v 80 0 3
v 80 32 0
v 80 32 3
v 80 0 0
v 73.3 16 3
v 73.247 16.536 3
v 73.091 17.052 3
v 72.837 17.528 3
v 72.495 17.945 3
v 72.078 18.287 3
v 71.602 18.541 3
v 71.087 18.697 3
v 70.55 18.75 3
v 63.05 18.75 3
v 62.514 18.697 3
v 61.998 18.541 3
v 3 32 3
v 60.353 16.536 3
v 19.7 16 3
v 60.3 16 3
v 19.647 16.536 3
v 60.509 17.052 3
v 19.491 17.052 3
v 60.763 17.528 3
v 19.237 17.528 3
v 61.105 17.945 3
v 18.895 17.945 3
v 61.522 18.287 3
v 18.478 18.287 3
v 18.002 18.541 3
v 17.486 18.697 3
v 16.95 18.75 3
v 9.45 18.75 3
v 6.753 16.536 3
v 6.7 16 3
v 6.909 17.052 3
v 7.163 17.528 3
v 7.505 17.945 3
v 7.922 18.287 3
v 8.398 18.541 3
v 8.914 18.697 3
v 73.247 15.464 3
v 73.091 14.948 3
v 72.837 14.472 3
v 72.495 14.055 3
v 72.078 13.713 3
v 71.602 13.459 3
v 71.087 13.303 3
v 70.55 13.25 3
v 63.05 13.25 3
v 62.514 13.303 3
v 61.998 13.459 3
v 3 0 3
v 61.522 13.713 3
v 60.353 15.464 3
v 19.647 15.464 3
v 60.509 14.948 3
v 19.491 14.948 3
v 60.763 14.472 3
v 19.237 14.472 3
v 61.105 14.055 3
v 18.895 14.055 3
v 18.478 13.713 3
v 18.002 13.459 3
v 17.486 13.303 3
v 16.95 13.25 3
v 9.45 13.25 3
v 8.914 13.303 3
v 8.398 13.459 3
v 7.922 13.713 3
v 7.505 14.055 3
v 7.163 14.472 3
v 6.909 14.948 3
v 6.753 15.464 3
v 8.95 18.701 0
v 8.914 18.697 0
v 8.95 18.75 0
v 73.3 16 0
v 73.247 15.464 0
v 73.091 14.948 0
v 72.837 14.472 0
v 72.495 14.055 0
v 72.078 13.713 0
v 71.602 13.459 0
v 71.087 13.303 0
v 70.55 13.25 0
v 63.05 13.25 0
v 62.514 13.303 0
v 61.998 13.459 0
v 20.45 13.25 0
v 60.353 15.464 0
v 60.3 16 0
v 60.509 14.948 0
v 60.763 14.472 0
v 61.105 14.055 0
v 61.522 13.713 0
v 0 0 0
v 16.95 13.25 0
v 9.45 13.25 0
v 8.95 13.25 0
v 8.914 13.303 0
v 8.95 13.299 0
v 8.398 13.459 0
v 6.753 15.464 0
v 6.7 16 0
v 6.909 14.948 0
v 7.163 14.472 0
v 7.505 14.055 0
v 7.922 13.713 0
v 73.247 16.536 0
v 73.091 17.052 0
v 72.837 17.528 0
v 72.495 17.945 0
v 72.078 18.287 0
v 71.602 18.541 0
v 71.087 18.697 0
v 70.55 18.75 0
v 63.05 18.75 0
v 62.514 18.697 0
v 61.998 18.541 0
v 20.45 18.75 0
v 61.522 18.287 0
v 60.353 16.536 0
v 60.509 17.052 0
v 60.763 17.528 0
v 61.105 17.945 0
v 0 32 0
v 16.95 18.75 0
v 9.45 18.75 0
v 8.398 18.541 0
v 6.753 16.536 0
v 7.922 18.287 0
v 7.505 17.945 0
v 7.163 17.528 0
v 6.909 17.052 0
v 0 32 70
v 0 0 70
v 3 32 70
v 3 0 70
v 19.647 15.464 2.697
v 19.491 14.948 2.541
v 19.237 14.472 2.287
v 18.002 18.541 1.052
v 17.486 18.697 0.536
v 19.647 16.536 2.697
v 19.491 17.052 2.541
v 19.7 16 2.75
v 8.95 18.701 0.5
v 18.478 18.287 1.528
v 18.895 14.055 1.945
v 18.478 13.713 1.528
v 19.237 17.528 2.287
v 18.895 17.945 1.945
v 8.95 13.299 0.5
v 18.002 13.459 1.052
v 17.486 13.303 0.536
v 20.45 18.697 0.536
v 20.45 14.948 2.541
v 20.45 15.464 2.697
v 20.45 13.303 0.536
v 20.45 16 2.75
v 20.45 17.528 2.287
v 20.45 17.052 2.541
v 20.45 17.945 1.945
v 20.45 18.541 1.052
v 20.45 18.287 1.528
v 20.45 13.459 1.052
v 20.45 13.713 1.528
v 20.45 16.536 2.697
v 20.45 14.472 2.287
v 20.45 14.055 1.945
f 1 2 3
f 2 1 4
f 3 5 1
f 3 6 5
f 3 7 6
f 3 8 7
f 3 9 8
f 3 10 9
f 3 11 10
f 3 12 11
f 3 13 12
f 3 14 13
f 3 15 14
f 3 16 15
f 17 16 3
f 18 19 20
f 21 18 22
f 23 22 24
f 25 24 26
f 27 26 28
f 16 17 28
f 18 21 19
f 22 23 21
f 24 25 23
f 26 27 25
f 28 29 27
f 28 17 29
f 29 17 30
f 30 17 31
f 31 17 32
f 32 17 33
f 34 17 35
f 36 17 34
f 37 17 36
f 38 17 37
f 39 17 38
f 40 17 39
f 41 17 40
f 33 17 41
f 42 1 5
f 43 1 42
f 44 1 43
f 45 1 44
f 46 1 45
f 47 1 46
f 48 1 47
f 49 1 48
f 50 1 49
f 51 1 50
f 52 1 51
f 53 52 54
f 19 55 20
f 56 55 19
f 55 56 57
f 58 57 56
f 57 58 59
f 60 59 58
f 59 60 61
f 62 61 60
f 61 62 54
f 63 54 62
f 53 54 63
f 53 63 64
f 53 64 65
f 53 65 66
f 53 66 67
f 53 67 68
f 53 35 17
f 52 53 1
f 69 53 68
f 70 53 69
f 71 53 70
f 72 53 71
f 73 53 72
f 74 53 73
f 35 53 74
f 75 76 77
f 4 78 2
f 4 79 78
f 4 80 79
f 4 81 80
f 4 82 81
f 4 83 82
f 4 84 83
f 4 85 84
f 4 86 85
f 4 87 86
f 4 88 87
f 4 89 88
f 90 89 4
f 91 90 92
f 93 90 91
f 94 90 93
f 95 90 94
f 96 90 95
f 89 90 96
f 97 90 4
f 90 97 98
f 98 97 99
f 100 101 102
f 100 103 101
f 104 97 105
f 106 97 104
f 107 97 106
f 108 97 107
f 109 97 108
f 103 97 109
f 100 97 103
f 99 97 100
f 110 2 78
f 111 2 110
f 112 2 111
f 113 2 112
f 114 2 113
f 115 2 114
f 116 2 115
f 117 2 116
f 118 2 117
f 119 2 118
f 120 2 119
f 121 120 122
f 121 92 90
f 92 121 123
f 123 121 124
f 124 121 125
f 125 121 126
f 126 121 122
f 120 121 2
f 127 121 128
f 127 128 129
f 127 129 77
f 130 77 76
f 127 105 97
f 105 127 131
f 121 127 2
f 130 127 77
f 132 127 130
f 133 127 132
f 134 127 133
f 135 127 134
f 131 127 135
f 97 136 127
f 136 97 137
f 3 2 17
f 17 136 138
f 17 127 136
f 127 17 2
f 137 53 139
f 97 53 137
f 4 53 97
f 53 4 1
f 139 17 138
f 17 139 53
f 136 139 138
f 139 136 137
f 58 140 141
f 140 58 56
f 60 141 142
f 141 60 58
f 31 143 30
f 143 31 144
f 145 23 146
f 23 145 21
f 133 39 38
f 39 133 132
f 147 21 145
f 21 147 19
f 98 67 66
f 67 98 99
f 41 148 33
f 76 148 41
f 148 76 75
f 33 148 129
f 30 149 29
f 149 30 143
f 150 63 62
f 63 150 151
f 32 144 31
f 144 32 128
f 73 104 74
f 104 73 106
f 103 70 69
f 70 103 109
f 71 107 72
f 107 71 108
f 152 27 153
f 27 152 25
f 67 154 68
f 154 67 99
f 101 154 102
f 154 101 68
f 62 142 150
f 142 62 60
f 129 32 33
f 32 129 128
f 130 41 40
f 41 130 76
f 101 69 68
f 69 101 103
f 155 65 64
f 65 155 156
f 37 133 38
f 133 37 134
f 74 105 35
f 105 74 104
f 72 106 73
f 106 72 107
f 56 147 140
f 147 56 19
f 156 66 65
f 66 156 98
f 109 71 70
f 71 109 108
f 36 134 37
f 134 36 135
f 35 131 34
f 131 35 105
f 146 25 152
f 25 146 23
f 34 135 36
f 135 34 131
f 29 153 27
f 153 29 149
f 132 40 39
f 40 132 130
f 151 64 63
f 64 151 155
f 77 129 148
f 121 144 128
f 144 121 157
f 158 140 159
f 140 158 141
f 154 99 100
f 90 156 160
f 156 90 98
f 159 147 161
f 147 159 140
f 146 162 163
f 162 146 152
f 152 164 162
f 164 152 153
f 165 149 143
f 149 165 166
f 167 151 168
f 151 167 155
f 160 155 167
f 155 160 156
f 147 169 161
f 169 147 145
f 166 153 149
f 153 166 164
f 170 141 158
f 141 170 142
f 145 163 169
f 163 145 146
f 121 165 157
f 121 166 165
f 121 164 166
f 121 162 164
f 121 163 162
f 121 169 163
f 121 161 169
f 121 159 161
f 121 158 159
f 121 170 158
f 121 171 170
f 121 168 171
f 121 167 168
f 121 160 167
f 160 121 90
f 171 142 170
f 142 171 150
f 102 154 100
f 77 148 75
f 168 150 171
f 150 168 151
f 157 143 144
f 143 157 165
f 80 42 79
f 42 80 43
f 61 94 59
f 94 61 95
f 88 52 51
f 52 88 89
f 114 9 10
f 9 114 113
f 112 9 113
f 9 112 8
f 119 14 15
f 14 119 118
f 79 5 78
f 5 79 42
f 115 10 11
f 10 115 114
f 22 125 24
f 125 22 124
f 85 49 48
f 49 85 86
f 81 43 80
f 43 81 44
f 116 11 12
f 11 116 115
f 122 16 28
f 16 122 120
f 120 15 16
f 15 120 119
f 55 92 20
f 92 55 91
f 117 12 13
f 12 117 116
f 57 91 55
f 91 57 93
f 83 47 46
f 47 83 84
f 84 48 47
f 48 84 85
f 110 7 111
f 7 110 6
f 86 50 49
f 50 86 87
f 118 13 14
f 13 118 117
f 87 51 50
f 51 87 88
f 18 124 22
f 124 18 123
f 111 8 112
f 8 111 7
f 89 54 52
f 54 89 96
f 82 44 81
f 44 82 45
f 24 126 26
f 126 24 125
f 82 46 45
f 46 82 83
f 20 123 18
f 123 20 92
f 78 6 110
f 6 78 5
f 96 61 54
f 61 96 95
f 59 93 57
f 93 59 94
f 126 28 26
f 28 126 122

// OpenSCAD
$fn = 32;

// ----------------------------------------------------------------------
// L-bracket: 80 x 32 x 70 mm
// ----------------------------------------------------------------------

// --- parameters (mm) ---
horiz_len = 80;           // horizontal leg, X
vert_len = 70;            // vertical leg, Z
profile_w = 32;           // bracket depth, Y
plate_t = 3;              // plate thickness
hole_d = 6.6;             // clearance for M6
slot_w = 5.5;             // euro screw slot width
slot_l = 13;              // euro screw slot length

module hole_z(px, py) {
  translate([px, py, -0.5]) cylinder(h = plate_t + 1, d = hole_d);
}
module hole_x(pz, py) {
  translate([-0.5, py, pz]) rotate([0, 90, 0]) cylinder(h = plate_t + 1, d = hole_d);
}
module euro_slot_z(px, py) {
  hull() {
    translate([px - (slot_l - slot_w) / 2, py, -0.5]) cylinder(h = plate_t + 1, d = slot_w);
    translate([px + (slot_l - slot_w) / 2, py, -0.5]) cylinder(h = plate_t + 1, d = slot_w);
  }
}
module euro_slot_x(pz, py) {
  translate([-0.5, 0, 0]) rotate([0, 90, 0]) hull() {
    translate([0, py, pz - (slot_l - slot_w) / 2]) cylinder(h = plate_t + 1, d = slot_w);
    translate([0, py, pz + (slot_l - slot_w) / 2]) cylinder(h = plate_t + 1, d = slot_w);
  }
}

difference() {
  union() {
    /* horizontal leg */
    cube([horiz_len, profile_w, plate_t]);
    /* vertical leg, overlapping the corner block */
    cube([plate_t, profile_w, vert_len]);
  }
  euro_slot_z(13.2, 16);
  euro_slot_x(13.2, 16);
  euro_slot_z(66.8, 16);
}
